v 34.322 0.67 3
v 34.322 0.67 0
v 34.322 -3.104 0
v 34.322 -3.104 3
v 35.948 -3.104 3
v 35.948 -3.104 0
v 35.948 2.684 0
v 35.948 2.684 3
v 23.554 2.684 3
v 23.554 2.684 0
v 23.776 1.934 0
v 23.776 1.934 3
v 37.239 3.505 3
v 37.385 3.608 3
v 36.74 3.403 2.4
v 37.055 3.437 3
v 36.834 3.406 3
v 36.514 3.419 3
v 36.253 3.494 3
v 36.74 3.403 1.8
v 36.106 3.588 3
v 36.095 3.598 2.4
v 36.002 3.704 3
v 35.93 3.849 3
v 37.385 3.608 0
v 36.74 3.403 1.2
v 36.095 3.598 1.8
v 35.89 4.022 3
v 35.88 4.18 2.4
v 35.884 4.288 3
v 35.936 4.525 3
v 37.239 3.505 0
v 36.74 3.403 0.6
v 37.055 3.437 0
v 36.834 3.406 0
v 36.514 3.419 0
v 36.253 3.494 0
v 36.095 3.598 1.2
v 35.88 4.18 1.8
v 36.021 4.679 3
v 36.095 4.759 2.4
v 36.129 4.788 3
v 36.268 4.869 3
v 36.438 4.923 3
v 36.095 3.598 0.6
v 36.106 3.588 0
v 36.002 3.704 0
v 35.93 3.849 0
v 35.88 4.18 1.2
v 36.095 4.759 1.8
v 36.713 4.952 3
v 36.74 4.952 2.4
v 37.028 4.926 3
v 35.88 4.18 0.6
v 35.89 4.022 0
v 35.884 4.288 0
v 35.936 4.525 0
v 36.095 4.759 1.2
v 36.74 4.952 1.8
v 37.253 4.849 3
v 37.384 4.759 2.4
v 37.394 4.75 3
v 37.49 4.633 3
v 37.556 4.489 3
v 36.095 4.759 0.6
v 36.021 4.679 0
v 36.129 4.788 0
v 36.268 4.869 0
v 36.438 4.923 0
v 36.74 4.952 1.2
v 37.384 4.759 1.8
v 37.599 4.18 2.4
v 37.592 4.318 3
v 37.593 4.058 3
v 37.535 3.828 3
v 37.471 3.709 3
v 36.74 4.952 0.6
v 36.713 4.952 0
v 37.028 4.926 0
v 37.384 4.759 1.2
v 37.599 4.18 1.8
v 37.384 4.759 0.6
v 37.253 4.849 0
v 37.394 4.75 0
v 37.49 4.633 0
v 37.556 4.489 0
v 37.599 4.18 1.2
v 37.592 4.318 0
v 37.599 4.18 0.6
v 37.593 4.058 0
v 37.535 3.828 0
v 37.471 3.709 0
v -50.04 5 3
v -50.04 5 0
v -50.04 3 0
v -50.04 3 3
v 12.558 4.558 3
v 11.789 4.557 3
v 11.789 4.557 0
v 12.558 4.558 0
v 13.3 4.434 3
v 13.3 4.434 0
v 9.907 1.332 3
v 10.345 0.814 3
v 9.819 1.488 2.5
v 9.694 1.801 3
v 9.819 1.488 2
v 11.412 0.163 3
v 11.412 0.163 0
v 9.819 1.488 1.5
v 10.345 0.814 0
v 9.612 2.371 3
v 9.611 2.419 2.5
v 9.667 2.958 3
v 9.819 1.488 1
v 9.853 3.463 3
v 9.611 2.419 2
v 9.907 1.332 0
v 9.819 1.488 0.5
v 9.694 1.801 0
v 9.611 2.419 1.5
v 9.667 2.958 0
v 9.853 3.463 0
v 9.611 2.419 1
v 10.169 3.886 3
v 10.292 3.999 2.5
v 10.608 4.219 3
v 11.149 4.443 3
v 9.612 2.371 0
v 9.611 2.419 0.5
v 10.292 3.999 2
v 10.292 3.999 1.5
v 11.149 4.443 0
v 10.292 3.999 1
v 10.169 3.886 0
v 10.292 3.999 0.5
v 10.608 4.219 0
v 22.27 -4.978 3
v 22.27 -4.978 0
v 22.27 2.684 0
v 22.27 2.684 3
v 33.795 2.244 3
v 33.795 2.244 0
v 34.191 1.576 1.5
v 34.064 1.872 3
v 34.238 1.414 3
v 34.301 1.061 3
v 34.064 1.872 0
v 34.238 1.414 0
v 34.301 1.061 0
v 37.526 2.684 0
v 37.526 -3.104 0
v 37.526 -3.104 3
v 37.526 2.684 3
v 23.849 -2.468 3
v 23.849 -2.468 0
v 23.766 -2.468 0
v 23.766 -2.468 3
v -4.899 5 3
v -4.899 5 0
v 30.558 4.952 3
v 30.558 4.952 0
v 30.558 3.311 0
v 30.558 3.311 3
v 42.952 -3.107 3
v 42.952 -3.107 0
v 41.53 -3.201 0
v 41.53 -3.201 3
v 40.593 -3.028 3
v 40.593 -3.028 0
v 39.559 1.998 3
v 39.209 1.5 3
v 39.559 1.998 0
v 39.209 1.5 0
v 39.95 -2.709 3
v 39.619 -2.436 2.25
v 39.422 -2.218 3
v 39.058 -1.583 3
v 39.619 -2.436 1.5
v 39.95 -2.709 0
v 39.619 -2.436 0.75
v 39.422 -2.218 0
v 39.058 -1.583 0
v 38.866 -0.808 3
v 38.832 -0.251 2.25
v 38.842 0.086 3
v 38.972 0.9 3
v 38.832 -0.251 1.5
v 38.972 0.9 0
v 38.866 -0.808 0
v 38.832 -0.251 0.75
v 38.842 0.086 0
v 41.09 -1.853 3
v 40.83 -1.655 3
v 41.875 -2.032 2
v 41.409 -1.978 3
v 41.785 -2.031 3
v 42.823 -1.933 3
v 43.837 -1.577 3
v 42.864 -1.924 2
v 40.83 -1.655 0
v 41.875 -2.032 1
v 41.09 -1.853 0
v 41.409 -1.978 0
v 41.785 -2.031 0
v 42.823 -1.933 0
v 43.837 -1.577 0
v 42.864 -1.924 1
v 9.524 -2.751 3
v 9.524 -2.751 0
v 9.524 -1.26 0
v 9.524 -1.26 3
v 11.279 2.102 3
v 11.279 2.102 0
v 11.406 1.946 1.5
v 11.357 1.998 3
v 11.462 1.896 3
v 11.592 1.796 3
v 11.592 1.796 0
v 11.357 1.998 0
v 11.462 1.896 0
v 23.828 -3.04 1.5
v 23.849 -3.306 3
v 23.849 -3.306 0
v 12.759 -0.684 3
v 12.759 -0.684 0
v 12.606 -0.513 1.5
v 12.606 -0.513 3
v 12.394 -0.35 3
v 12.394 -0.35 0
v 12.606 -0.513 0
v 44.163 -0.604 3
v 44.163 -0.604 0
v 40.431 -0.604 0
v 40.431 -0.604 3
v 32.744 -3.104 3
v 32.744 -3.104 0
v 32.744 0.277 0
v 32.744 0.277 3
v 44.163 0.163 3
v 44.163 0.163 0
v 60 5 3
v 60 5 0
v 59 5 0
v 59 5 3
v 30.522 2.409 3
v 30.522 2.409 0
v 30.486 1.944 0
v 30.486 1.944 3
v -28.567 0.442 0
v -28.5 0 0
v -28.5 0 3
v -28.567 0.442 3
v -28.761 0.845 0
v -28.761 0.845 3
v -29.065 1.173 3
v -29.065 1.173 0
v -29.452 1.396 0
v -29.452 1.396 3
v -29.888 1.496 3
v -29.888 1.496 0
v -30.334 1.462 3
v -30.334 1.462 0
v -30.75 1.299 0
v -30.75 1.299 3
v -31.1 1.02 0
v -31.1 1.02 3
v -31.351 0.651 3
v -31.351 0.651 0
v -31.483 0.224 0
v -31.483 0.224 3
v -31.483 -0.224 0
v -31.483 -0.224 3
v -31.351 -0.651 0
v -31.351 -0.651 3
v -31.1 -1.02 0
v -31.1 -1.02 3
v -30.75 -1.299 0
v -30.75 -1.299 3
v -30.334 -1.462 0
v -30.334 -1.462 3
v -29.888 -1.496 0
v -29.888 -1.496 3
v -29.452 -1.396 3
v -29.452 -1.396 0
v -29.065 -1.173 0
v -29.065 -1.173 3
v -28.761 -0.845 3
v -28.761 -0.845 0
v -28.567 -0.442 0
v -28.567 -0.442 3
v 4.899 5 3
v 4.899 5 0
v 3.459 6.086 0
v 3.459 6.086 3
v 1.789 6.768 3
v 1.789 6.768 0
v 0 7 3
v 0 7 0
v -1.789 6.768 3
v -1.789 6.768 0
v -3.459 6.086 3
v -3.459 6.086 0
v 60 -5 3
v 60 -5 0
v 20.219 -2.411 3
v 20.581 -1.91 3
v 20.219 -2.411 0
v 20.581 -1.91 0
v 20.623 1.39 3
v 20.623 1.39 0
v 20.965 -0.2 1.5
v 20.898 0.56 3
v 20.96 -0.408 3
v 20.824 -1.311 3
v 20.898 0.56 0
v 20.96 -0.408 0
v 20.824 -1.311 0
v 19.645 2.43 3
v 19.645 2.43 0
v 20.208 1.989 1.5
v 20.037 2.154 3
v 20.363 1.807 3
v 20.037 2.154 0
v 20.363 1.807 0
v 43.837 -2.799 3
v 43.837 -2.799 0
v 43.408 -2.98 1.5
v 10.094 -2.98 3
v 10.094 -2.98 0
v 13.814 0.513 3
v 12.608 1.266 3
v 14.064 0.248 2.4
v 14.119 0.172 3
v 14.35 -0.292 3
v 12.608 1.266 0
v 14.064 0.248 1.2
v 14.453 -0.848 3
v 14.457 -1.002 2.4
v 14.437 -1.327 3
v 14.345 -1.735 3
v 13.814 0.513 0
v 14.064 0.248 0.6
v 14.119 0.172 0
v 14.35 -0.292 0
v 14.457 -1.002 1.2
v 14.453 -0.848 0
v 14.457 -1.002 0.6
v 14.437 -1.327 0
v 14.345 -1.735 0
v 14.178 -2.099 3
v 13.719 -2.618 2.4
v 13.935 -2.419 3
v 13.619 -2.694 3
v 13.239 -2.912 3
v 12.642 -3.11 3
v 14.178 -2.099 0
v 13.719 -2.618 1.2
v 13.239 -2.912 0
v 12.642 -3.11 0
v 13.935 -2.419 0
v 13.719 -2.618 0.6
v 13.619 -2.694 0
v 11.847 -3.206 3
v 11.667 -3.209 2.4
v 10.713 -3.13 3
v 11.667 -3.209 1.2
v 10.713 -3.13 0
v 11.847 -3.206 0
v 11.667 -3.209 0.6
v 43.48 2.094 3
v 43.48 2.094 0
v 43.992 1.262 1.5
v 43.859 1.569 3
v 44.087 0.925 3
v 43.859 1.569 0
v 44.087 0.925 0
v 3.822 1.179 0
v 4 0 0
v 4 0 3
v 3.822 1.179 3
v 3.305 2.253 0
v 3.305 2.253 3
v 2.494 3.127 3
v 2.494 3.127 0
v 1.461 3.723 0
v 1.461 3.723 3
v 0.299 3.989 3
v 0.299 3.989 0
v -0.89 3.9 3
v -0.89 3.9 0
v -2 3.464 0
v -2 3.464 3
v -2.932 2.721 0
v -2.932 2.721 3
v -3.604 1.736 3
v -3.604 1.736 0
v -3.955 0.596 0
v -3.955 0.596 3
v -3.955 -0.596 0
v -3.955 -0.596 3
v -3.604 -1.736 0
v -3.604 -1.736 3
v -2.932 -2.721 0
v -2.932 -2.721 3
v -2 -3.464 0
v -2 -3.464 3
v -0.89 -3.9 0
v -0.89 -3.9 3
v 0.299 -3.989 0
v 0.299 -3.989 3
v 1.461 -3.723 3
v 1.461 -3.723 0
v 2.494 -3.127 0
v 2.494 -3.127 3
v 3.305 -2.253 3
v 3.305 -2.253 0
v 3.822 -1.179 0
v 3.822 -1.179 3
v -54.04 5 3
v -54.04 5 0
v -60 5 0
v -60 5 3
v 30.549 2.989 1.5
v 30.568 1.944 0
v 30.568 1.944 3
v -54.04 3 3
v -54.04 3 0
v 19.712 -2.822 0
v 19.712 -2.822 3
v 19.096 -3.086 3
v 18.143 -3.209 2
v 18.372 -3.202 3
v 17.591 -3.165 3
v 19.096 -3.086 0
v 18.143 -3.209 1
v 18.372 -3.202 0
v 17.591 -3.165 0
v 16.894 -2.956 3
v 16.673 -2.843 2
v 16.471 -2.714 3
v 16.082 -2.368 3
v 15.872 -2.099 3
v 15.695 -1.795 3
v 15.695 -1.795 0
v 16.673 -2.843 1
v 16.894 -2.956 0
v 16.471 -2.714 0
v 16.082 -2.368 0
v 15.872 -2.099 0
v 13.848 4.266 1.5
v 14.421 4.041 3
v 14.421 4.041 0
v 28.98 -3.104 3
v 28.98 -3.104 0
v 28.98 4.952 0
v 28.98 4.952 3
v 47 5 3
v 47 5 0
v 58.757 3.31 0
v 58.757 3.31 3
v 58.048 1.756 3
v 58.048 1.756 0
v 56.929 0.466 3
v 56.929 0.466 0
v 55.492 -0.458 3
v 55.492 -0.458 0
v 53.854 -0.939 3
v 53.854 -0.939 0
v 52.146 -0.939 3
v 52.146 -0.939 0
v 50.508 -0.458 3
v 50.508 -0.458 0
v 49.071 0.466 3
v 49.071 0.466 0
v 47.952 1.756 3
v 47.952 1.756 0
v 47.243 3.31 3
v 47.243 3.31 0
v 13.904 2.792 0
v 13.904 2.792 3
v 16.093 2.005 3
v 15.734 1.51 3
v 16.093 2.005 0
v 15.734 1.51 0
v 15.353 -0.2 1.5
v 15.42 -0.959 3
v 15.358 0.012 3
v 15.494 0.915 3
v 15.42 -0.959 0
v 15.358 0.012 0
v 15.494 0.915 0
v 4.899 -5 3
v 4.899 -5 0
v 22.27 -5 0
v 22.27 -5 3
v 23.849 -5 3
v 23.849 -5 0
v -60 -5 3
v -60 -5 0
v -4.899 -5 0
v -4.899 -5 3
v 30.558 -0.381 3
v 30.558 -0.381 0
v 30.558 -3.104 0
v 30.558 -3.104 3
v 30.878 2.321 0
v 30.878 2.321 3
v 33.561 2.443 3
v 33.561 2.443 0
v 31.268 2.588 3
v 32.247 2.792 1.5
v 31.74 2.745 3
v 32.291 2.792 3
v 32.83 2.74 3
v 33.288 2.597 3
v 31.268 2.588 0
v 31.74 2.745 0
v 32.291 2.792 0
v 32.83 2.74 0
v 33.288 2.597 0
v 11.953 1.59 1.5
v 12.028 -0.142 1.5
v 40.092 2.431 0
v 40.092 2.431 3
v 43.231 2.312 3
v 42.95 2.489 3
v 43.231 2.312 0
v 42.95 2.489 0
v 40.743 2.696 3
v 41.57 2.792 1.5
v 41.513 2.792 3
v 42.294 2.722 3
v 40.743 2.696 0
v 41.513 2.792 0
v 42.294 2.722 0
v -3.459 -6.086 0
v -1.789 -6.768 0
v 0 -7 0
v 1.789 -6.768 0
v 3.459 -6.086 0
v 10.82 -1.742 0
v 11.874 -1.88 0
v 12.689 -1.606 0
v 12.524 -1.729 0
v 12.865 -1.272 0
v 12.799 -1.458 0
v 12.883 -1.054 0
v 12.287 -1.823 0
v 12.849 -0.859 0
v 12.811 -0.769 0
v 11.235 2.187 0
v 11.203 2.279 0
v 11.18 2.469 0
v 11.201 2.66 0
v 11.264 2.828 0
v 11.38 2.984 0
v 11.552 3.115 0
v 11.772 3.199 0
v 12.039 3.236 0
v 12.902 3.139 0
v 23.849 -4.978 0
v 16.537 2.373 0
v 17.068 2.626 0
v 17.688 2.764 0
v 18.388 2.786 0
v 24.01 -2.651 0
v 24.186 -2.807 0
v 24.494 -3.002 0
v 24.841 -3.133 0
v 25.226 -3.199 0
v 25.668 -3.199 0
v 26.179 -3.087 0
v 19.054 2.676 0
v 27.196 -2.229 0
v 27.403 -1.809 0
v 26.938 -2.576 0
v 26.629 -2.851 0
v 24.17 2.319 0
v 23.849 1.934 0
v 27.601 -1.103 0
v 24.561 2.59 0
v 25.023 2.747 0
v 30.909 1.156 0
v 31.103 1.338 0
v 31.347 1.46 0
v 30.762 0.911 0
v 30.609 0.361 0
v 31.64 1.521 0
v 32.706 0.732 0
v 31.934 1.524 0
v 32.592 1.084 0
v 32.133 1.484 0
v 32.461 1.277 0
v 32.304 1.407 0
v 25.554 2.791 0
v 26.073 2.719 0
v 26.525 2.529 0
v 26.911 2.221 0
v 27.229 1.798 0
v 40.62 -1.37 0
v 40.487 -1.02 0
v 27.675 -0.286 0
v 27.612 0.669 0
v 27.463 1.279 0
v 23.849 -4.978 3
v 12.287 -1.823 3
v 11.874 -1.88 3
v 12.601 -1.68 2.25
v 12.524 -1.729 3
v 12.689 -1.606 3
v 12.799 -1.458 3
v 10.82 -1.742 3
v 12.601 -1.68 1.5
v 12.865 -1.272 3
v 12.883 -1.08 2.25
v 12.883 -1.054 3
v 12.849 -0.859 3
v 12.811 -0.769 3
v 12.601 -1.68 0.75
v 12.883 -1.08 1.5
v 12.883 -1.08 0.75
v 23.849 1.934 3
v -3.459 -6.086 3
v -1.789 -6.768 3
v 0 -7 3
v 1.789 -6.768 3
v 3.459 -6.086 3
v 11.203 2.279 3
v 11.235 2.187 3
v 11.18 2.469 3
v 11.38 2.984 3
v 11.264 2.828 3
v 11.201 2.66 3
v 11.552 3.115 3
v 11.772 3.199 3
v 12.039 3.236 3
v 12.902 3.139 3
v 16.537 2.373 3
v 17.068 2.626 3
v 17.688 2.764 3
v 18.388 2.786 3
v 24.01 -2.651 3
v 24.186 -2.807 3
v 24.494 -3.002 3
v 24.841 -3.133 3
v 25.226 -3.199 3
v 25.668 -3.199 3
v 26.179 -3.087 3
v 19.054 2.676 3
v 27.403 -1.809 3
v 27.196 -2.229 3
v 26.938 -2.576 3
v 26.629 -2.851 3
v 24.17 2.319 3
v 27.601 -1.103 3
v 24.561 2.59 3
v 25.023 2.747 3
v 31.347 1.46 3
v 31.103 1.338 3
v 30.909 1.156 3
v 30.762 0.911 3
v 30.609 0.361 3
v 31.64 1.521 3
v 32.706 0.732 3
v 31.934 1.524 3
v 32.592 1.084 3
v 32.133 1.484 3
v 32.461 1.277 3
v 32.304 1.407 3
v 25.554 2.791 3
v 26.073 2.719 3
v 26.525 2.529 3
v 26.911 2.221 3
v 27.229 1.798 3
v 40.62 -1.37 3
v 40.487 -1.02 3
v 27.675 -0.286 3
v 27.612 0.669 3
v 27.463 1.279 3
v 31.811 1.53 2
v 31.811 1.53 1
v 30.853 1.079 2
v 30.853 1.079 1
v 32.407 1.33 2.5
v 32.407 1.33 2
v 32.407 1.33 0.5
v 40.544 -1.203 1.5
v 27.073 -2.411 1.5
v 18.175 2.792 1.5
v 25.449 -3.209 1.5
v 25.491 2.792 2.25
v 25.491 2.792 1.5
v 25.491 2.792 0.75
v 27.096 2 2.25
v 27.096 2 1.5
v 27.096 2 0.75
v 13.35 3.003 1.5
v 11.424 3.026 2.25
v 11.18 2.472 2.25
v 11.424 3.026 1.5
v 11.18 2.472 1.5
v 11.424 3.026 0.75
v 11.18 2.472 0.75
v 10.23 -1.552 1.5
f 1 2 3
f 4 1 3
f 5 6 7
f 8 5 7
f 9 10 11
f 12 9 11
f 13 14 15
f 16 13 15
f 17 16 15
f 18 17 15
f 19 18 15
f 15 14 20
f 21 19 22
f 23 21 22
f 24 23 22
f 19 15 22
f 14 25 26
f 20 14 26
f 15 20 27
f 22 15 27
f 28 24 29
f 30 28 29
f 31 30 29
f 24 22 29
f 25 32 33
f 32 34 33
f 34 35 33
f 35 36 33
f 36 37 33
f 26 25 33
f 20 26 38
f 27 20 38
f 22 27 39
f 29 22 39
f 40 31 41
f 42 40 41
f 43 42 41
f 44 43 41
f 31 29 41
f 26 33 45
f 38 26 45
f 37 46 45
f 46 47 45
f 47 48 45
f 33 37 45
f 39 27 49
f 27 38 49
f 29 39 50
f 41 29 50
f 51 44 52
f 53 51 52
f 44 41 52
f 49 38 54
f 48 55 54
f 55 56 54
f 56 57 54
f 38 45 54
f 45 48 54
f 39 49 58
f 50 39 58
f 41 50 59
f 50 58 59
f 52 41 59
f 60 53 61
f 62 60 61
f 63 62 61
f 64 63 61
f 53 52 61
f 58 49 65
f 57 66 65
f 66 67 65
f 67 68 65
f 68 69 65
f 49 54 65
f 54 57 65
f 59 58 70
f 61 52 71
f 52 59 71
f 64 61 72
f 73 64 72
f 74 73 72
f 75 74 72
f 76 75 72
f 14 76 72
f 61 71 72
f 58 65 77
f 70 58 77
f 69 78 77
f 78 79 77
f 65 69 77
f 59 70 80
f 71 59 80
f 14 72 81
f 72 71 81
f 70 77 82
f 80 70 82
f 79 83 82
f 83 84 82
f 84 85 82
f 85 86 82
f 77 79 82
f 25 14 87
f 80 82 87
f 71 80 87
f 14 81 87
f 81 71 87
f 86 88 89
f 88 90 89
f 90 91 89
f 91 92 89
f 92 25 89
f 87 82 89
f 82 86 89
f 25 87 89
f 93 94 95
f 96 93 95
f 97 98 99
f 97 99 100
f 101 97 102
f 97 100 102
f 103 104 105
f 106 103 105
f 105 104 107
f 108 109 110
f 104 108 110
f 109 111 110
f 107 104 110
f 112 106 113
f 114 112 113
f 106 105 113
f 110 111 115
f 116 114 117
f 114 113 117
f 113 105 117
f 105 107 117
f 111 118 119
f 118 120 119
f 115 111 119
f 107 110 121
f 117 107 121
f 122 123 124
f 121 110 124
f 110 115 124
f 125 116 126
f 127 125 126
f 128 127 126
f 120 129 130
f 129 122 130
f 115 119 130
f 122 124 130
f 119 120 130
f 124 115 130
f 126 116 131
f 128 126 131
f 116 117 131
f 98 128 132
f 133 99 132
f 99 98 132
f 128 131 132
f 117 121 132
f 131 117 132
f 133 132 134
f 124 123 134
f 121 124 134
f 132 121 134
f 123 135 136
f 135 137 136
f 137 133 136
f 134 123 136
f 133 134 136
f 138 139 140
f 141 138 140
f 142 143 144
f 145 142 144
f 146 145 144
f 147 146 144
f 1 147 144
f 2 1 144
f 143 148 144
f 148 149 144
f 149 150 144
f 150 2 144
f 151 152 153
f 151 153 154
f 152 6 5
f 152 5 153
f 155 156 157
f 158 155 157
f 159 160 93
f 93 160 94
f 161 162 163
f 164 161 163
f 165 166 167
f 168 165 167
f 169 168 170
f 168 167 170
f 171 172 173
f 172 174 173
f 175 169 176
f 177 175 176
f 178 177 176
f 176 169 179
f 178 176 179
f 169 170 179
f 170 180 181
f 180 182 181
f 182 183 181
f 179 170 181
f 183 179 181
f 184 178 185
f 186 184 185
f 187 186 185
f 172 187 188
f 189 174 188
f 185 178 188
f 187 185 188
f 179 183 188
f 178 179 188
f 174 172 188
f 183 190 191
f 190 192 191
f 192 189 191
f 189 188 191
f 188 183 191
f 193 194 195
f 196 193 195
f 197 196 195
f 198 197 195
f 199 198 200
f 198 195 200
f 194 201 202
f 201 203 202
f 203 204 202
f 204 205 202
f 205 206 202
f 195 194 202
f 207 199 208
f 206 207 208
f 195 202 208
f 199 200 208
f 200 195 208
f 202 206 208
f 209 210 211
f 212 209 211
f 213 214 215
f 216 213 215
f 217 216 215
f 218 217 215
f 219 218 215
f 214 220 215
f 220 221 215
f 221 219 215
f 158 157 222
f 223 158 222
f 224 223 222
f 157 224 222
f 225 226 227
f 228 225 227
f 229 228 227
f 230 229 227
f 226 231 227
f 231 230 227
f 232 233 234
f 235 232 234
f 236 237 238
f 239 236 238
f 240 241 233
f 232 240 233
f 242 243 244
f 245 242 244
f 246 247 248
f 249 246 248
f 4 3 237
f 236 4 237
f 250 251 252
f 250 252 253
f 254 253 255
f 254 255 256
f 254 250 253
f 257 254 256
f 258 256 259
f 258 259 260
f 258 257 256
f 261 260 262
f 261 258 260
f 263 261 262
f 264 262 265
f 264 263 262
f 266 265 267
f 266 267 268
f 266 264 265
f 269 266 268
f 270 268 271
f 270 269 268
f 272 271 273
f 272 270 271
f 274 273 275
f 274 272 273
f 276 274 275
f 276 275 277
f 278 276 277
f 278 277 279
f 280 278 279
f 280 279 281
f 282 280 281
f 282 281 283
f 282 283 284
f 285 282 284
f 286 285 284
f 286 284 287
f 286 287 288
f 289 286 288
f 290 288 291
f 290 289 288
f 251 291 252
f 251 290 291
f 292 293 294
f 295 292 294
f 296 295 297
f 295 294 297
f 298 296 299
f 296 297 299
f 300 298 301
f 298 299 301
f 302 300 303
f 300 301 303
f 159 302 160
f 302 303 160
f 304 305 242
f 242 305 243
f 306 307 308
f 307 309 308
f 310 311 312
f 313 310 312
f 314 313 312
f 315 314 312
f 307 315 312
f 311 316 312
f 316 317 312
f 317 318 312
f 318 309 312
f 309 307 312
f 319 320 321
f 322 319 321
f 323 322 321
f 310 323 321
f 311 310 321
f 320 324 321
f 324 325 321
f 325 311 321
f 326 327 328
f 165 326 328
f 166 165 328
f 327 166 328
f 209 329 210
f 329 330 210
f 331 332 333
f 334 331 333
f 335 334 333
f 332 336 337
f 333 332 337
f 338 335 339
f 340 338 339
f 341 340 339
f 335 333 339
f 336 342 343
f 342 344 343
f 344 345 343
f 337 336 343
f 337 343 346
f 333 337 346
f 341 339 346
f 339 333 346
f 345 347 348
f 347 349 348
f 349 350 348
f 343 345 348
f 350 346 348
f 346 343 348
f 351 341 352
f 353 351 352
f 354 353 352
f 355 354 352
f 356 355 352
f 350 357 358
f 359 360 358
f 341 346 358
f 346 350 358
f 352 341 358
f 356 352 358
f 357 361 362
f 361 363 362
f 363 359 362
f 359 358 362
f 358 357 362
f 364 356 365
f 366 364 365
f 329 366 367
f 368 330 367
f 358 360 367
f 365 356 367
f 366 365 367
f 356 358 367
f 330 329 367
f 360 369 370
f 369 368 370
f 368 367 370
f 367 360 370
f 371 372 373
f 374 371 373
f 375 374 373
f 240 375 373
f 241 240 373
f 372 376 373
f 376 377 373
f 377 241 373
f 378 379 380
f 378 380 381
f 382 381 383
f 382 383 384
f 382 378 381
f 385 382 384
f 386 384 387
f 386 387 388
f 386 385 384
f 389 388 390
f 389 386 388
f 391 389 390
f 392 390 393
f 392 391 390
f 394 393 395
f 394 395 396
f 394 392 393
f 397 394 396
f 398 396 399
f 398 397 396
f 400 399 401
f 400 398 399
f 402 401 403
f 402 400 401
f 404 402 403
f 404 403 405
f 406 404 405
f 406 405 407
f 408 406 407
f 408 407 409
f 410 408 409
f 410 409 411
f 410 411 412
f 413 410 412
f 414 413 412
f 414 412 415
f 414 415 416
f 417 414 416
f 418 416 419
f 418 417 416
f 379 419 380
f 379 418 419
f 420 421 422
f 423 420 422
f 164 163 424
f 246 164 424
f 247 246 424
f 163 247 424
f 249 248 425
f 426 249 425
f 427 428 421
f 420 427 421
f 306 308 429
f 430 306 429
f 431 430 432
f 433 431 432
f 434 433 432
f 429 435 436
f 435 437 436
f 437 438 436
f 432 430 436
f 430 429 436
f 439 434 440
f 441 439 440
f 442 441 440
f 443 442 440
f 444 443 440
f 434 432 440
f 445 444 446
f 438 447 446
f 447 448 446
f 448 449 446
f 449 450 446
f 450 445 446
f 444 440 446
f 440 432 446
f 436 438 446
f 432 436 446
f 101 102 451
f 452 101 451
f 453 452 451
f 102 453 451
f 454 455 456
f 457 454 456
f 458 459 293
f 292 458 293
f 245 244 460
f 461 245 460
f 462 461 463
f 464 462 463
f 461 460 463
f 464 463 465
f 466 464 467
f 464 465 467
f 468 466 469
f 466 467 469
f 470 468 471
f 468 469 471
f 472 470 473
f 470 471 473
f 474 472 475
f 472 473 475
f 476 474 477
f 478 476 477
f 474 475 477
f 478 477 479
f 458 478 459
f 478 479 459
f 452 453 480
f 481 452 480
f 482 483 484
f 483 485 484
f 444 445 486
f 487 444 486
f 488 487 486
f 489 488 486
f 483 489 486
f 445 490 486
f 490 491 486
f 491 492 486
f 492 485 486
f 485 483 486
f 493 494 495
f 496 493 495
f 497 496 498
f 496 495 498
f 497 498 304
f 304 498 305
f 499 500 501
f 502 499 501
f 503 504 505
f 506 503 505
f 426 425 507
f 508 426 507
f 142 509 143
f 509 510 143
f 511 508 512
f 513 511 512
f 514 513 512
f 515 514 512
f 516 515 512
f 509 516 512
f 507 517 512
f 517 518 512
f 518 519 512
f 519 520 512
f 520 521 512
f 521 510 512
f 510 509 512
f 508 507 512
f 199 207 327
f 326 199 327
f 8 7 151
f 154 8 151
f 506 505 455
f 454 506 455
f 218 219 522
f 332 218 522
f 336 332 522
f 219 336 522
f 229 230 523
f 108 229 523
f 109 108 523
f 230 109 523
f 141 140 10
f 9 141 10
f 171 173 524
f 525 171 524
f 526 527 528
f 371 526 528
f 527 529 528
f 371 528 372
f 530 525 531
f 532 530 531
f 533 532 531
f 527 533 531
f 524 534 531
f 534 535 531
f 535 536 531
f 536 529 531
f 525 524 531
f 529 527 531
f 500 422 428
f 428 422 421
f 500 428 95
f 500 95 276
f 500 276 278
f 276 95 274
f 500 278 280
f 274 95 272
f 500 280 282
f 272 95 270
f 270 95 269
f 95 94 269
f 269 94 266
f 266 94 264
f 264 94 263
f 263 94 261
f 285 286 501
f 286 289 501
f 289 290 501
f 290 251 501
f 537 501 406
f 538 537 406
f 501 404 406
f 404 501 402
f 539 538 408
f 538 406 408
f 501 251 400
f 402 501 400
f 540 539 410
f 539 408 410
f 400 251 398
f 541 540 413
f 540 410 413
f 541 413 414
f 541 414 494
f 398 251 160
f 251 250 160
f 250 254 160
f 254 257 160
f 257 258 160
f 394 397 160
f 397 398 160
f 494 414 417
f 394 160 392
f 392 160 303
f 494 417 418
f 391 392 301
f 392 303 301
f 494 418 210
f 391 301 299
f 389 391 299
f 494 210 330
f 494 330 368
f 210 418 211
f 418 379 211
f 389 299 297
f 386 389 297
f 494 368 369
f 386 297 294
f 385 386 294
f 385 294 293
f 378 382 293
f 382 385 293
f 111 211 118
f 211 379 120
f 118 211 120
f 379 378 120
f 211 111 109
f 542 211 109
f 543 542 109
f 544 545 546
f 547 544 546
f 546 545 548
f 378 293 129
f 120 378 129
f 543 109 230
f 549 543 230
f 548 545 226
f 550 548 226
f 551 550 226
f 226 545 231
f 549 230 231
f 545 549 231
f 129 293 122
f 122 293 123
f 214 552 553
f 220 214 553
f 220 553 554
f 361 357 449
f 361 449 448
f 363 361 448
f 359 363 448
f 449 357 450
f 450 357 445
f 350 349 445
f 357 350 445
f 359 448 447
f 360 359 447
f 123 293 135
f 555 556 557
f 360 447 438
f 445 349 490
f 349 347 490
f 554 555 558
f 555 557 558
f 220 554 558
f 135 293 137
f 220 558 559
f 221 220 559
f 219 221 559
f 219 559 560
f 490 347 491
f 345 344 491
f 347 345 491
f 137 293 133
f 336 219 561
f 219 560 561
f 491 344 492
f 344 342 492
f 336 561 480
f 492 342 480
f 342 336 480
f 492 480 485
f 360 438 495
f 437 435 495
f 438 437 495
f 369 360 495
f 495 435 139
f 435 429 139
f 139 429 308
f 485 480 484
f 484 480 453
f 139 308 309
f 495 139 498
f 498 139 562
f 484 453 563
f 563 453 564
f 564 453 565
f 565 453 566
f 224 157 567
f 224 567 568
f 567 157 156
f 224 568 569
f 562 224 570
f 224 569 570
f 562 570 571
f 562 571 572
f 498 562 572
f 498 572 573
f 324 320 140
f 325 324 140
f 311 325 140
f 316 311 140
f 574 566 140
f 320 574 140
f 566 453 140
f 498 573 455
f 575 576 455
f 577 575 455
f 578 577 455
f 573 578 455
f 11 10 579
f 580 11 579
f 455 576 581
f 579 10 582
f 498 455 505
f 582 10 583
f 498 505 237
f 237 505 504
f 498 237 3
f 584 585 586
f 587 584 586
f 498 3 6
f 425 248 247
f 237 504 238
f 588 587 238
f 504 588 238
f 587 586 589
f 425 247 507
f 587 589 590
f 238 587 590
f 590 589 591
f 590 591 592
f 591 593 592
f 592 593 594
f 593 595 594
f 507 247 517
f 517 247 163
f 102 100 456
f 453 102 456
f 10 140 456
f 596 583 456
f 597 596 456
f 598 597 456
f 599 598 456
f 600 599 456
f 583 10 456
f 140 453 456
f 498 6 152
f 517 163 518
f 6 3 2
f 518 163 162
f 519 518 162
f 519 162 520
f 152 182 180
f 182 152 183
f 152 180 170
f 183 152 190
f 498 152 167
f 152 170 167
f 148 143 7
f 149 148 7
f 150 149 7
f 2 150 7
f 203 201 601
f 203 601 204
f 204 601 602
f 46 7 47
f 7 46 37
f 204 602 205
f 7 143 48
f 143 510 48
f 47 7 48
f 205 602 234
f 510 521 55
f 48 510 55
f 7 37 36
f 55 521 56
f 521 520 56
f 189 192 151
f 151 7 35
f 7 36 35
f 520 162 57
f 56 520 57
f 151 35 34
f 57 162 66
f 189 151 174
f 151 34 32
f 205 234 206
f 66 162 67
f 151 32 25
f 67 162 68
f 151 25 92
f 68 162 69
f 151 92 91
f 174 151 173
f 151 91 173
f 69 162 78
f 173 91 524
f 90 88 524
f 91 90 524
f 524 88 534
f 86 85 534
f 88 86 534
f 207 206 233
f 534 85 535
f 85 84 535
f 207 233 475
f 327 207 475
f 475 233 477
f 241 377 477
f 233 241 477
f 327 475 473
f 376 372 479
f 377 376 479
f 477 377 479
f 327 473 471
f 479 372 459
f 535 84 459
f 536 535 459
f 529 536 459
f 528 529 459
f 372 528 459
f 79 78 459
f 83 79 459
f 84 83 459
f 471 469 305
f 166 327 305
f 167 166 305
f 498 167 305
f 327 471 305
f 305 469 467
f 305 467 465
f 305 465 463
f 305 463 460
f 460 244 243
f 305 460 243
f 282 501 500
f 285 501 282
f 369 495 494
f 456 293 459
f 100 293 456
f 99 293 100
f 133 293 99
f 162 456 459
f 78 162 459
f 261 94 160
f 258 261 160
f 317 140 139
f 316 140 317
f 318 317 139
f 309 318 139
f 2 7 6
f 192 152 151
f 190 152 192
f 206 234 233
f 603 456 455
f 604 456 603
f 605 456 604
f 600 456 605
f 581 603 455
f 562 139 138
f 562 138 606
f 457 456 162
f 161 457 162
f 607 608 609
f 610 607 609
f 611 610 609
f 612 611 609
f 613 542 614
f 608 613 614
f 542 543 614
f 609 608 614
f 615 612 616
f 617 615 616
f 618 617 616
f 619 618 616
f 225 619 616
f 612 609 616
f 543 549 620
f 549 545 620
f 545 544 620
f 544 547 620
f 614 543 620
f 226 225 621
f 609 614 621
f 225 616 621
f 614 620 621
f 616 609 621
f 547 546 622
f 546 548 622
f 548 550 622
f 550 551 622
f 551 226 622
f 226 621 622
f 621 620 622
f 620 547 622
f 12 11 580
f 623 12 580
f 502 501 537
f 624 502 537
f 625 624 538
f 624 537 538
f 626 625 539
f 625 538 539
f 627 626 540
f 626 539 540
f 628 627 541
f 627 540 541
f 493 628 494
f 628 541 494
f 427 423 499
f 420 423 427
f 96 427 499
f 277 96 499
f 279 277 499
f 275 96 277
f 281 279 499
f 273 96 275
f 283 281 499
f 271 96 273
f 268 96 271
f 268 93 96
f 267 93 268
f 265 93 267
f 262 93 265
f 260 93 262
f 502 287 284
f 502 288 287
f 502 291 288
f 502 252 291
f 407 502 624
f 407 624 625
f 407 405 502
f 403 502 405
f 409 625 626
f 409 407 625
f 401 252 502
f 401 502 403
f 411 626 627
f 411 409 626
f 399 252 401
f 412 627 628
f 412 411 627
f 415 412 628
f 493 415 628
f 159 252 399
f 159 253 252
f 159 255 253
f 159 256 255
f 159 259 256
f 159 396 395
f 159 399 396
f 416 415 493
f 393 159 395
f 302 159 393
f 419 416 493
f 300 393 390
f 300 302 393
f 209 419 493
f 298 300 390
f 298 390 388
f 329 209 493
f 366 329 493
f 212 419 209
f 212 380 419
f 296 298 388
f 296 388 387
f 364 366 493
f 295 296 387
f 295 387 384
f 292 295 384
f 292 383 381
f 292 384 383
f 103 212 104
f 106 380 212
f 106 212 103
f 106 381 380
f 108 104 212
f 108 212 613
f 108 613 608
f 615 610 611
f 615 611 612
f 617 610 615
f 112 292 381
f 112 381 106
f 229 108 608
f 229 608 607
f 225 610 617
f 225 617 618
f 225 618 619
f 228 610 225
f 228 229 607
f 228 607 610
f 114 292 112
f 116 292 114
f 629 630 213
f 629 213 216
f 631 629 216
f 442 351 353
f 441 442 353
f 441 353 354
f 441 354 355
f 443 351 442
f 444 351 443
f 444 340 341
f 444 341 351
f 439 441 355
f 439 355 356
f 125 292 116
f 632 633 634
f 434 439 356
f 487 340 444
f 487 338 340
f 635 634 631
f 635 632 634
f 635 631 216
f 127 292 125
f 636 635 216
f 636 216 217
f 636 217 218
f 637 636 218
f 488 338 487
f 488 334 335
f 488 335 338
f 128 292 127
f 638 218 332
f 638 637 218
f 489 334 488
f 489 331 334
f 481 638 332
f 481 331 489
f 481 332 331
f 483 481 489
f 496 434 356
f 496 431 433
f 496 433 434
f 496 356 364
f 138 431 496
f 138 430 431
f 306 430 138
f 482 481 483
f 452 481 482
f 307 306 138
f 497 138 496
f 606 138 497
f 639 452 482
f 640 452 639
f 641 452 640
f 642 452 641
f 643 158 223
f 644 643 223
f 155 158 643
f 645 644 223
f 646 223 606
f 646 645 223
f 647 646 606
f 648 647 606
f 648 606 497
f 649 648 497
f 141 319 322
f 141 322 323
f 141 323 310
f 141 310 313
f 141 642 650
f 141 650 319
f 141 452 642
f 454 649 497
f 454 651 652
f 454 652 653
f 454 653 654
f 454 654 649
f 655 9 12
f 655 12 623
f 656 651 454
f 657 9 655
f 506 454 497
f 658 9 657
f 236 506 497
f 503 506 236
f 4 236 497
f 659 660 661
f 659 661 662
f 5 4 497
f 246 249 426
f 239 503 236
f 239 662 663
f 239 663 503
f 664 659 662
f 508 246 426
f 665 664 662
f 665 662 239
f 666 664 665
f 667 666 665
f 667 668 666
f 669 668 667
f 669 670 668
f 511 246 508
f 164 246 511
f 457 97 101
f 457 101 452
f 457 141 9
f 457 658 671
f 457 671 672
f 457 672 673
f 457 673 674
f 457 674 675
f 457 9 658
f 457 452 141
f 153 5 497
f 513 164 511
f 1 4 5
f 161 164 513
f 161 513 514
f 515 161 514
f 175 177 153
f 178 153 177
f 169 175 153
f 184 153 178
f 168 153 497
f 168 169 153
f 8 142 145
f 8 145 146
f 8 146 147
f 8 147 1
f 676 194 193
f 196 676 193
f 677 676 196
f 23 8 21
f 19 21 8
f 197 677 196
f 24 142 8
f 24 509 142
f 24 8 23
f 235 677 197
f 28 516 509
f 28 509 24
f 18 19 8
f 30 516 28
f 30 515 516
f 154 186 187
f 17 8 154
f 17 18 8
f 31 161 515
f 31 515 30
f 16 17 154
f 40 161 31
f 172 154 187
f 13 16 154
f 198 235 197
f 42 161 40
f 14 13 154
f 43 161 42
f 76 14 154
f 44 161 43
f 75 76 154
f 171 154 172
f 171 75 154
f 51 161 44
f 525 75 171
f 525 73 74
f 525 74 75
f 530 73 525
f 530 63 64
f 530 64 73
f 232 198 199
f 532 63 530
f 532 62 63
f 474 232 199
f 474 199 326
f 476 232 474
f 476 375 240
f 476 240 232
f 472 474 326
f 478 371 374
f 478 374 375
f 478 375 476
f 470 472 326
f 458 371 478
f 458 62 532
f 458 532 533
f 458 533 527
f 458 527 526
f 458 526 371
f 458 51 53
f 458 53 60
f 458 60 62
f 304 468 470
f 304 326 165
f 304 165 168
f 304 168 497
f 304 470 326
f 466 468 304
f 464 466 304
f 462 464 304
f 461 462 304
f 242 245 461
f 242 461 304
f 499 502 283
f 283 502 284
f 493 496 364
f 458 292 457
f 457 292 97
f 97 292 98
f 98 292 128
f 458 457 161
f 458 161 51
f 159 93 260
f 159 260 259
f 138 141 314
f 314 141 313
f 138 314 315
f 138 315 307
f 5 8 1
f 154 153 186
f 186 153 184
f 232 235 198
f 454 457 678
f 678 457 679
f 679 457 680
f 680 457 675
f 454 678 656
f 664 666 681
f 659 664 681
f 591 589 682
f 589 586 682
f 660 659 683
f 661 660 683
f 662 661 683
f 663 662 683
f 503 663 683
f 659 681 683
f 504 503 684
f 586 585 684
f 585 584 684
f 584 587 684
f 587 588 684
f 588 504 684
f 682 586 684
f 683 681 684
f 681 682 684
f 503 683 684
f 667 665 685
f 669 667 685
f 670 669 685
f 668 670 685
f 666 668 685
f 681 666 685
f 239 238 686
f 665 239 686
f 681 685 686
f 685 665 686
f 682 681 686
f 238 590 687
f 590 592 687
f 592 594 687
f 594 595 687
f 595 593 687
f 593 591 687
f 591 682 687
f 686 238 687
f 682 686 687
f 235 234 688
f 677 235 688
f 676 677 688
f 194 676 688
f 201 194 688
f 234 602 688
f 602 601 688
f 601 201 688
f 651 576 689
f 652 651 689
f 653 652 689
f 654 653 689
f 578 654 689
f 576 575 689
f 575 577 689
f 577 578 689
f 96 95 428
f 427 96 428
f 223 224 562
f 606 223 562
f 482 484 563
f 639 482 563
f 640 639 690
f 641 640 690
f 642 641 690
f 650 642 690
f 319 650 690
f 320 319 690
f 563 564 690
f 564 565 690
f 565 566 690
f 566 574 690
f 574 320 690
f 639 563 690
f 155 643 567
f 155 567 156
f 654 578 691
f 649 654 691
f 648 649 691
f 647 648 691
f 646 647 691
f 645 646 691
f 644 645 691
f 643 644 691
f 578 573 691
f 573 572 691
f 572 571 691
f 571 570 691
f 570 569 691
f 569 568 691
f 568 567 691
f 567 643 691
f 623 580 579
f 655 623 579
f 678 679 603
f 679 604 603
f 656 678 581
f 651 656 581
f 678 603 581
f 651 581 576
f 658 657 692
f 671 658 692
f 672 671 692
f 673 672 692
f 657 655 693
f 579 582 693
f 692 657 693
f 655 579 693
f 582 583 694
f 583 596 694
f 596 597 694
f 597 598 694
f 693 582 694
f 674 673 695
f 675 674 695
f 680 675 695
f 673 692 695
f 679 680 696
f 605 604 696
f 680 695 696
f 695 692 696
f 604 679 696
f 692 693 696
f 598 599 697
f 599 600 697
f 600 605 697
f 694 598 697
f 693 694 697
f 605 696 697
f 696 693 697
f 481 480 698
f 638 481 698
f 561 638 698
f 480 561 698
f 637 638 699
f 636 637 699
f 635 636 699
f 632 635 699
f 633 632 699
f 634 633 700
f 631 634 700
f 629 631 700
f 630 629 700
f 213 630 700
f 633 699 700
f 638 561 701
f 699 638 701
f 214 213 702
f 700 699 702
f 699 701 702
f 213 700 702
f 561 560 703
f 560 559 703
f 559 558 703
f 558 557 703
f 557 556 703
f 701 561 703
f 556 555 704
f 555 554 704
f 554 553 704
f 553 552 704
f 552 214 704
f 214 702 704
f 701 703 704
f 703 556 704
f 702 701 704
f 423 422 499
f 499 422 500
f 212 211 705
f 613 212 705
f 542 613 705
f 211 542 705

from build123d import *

# Parameters (mm, degrees)
F0_R     = 1.5
F0_R_2   = 4
F0_W     = 1.5788115779
F0_H     = 5.7884235604
F0_H_2   = 0.0224566273
F1_DEPTH = 3


with BuildPart() as f1:
    # F0 (on Top) → F1 (new body)
    with BuildSketch(Plane.XY):
        with BuildLine():
            Line((-54.0401674807, 5), (-60, 5))
            Line((-60, 5), (-60, -5))
            Line((-60, -5), (-4.8989794856, -5))
            ThreePointArc((-4.8989794856, -5), (-7, 0), (-4.8989794856, 5))
            Line((-4.8989794856, 5), (-50.0401674807, 5))
            Line((-50.0401674807, 5), (-50.0401674807, 3))
            Line((-50.0401674807, 3), (-54.0401674807, 3))
            Line((-54.0401674807, 3), (-54.0401674807, 5))
        make_face()
        with Locations((-30, 0)):
            Circle(F0_R, mode=Mode.SUBTRACT)
        with BuildLine():
            ThreePointArc((-4.8989794856, 5), (-7, 0), (-4.8989794856, -5))
            Line((-4.8989794856, -5), (4.8989794856, -5))
            ThreePointArc((4.8989794856, -5), (6.4534043883, -2.7117470016), (7, 0))
            ThreePointArc((7, 0), (6.4534043883, 2.7117470016), (4.8989794856, 5))
            Line((4.8989794856, 5), (-4.8989794856, 5))
        make_face()
        Circle(F0_R_2, mode=Mode.SUBTRACT)
        with BuildLine():
            Line((4.8989794856, -5), (-4.8989794856, -5))
            ThreePointArc((-4.8989794856, -5), (0, -7), (4.8989794856, -5))
        make_face()
        with BuildLine():
            ThreePointArc((4.8989794856, 5), (0, 7), (-4.8989794856, 5))
            Line((-4.8989794856, 5), (4.8989794856, 5))
        make_face()
        with BuildLine():
            ThreePointArc((7, 0), (6.4534043883, -2.7117470016), (4.8989794856, -5))
            Line((4.8989794856, -5), (22.270108379, -5))
            Line((22.270108379, -5), (22.270108379, -4.9775433727))
            Line((22.270108379, -4.9775433727), (22.270108379, 2.6842929448))
            Line((22.270108379, 2.6842929448), (23.5540317503, 2.6842929448))
            Line((23.5540317503, 2.6842929448), (23.7760262429, 1.9338190258))
            Line((23.7760262429, 1.9338190258), (23.8489199569, 1.9338190258))
            add(Edge.make_bspline(
                [(23.8489199569, 1.9338190258), (24.4039061884, 2.7919768404), (25.4906851969, 2.7919768404)],
                knots=[0, 0, 0, 1, 1, 1], degree=2))
            add(Edge.make_bspline(
                [(25.4906851969, 2.7919768404), (26.5161672186, 2.7919768404), (27.0960035798, 2.0000860385)],
                knots=[0, 0, 0, 1, 1, 1], degree=2))
            add(Edge.make_bspline(
                [(27.0960035798, 2.0000860385), (27.675839941, 1.2081952366), (27.675839941, -0.1999787835)],
                knots=[0, 0, 0, 1, 1, 1], degree=2))
            add(Edge.make_bspline(
                [(27.675839941, -0.1999787835), (27.675839941, -1.1260602862), (27.4033168513, -1.8094388548)],
                knots=[0, 0, 0, 1, 1, 1], degree=2))
            add(Edge.make_bspline(
                [(27.4033168513, -1.8094388548), (27.1307937615, -2.4928174234), (26.6288211402, -2.850659292)],
                knots=[0, 0, 0, 1, 1, 1], degree=2))
            add(Edge.make_bspline(
                [(26.6288211402, -2.850659292), (26.1268485189, -3.2085011607), (25.4492683139, -3.2085011607)],
                knots=[0, 0, 0, 1, 1, 1], degree=2))
            add(Edge.make_bspline(
                [(25.4492683139, -3.2085011607), (24.4287563181, -3.2085011607), (23.8489199569, -2.4679672936)],
                knots=[0, 0, 0, 1, 1, 1], degree=2))
            Line((23.8489199569, -2.4679672936), (23.766086191, -2.4679672936))
            add(Edge.make_bspline(
                [(23.766086191, -2.4679672936), (23.8489199569, -3.1919344075), (23.8489199569, -3.3062450044)],
                knots=[0, 0, 0, 1, 1, 1], degree=2))
            Line((23.8489199569, -3.3062450044), (23.8489199569, -4.9775433727))
            Line((23.8489199569, -4.9775433727), (23.8489199569, -5))
            Line((23.8489199569, -5), (60, -5))
            Line((60, -5), (60, 5))
            Line((60, 5), (59, 5))
            ThreePointArc((59, 5), (53, -1), (47, 5))
            Line((47, 5), (4.8989794856, 5))
            ThreePointArc((4.8989794856, 5), (6.4534043883, 2.7117470016), (7, 0))
        make_face()
        with BuildLine():
            add(Edge.make_bspline(
                [(14.0637671923, 0.2481518899), (14.4572275803, -0.2612757703), (14.4572275803, -1.0018096374)],
                knots=[0, 0, 0, 1, 1, 1], degree=2))
            add(Edge.make_bspline(
                [(14.4572275803, -1.0018096374), (14.4572275803, -2.0272916591), (13.7191787262, -2.6178964099)],
                knots=[0, 0, 0, 1, 1, 1], degree=2))
            add(Edge.make_bspline(
                [(13.7191787262, -2.6178964099), (12.9811298721, -3.2085011607), (11.6673863451, -3.2085011607)],
                knots=[0, 0, 0, 1, 1, 1], degree=2))
            add(Edge.make_bspline(
                [(11.6673863451, -3.2085011607), (10.4547000125, -3.2085011607), (9.5236484838, -2.751258773)],
                knots=[0, 0, 0, 1, 1, 1], degree=2))
            Line((9.5236484838, -2.751258773), (9.5236484838, -1.2602509869))
            add(Edge.make_bspline(
                [(9.5236484838, -1.2602509869), (10.2890324807, -1.6031827777), (10.81999692, -1.7423435044)],
                knots=[0, 0, 0, 1, 1, 1], degree=2))
            add(Edge.make_bspline(
                [(10.81999692, -1.7423435044), (11.3509613594, -1.8815042311), (11.7916369939, -1.8815042311)],
                knots=[0, 0, 0, 1, 1, 1], degree=2))
            add(Edge.make_bspline(
                [(11.7916369939, -1.8815042311), (12.318459745, -1.8815042311), (12.6009228867, -1.68021818)],
                knots=[0, 0, 0, 1, 1, 1], degree=2))
            add(Edge.make_bspline(
                [(12.6009228867, -1.68021818), (12.8833860284, -1.4789321289), (12.8833860284, -1.0796733773)],
                knots=[0, 0, 0, 1, 1, 1], degree=2))
            add(Edge.make_bspline(
                [(12.8833860284, -1.0796733773), (12.8833860284, -0.8576788847), (12.7591353795, -0.6837279763)],
                knots=[0, 0, 0, 1, 1, 1], degree=2))
            add(Edge.make_bspline(
                [(12.7591353795, -0.6837279763), (12.6348847307, -0.509777068), (12.3938384719, -0.3499078998)],
                knots=[0, 0, 0, 1, 1, 1], degree=2))
            add(Edge.make_bspline(
                [(12.3938384719, -0.3499078998), (12.1527922132, -0.1900387316), (11.4122583461, 0.162833111)],
                knots=[0, 0, 0, 1, 1, 1], degree=2))
            add(Edge.make_bspline(
                [(11.4122583461, 0.162833111), (10.7197680633, 0.4891981487), (10.3726945842, 0.7890563812)],
                knots=[0, 0, 0, 1, 1, 1], degree=2))
            add(Edge.make_bspline(
                [(10.3726945842, 0.7890563812), (10.0256211051, 1.0889146137), (9.8185366904, 1.4881733653)],
                knots=[0, 0, 0, 1, 1, 1], degree=2))
            add(Edge.make_bspline(
                [(9.8185366904, 1.4881733653), (9.6114522757, 1.8874321169), (9.6114522757, 2.4192248939)],
                knots=[0, 0, 0, 1, 1, 1], degree=2))
            add(Edge.make_bspline(
                [(9.6114522757, 2.4192248939), (9.6114522757, 3.4248268118), (10.2923458313, 3.9988648094)],
                knots=[0, 0, 0, 1, 1, 1], degree=2))
            add(Edge.make_bspline(
                [(10.2923458313, 3.9988648094), (10.9732393869, 4.572902807), (12.1743289923, 4.572902807)],
                knots=[0, 0, 0, 1, 1, 1], degree=2))
            add(Edge.make_bspline(
                [(12.1743289923, 4.572902807), (12.7641054055, 4.572902807), (13.3000398708, 4.4337420804)],
                knots=[0, 0, 0, 1, 1, 1], degree=2))
            add(Edge.make_bspline(
                [(13.3000398708, 4.4337420804), (13.8359743361, 4.2945813537), (14.4207807233, 4.04111003)],
                knots=[0, 0, 0, 1, 1, 1], degree=2))
            Line((14.4207807233, 4.04111003), (13.9038980241, 2.7919768404))
            add(Edge.make_bspline(
                [(13.9038980241, 2.7919768404), (13.2975548578, 3.0404781381), (12.9016094569, 3.1390503195)],
                knots=[0, 0, 0, 1, 1, 1], degree=2))
            add(Edge.make_bspline(
                [(12.9016094569, 3.1390503195), (12.5056640559, 3.2376225009), (12.1229720575, 3.2376225009)],
                knots=[0, 0, 0, 1, 1, 1], degree=2))
            add(Edge.make_bspline(
                [(12.1229720575, 3.2376225009), (11.6673863451, 3.2376225009), (11.4238550734, 3.0255680602)],
                knots=[0, 0, 0, 1, 1, 1], degree=2))
            add(Edge.make_bspline(
                [(11.4238550734, 3.0255680602), (11.1803238017, 2.8135136195), (11.1803238017, 2.4722385041)],
                knots=[0, 0, 0, 1, 1, 1], degree=2))
            add(Edge.make_bspline(
                [(11.1803238017, 2.4722385041), (11.1803238017, 2.2601840634), (11.2788959831, 2.1019715705)],
                knots=[0, 0, 0, 1, 1, 1], degree=2))
            add(Edge.make_bspline(
                [(11.2788959831, 2.1019715705), (11.3774681645, 1.9437590777), (11.5920076181, 1.7963149744)],
                knots=[0, 0, 0, 1, 1, 1], degree=2))
            add(Edge.make_bspline(
                [(11.5920076181, 1.7963149744), (11.8065470718, 1.6488708711), (12.6083779256, 1.2661788727)],
                knots=[0, 0, 0, 1, 1, 1], degree=2))
            add(Edge.make_bspline(
                [(12.6083779256, 1.2661788727), (13.6703068043, 0.7575795501), (14.0637671923, 0.2481518899)],
                knots=[0, 0, 0, 1, 1, 1], degree=2))
        make_face(mode=Mode.SUBTRACT)
        with BuildLine():
            add(Edge.make_bspline(
                [(20.6233731131, 1.3896011839), (20.9646482286, 0.7111926412), (20.9646482286, -0.1999787835)],
                knots=[0, 0, 0, 1, 1, 1], degree=2))
            add(Edge.make_bspline(
                [(20.9646482286, -0.1999787835), (20.9646482286, -1.6131228296), (20.2191443356, -2.4108119952)],
                knots=[0, 0, 0, 1, 1, 1], degree=2))
            add(Edge.make_bspline(
                [(20.2191443356, -2.4108119952), (19.4736404426, -3.2085011607), (18.1433301624, -3.2085011607)],
                knots=[0, 0, 0, 1, 1, 1], degree=2))
            add(Edge.make_bspline(
                [(18.1433301624, -3.2085011607), (17.3100224775, -3.2085011607), (16.6730308178, -2.8432042531)],
                knots=[0, 0, 0, 1, 1, 1], degree=2))
            add(Edge.make_bspline(
                [(16.6730308178, -2.8432042531), (16.0360391581, -2.4779073455), (15.6947640427, -1.7945287769)],
                knots=[0, 0, 0, 1, 1, 1], degree=2))
            add(Edge.make_bspline(
                [(15.6947640427, -1.7945287769), (15.3534889272, -1.1111502083), (15.3534889272, -0.1999787835)],
                knots=[0, 0, 0, 1, 1, 1], degree=2))
            add(Edge.make_bspline(
                [(15.3534889272, -0.1999787835), (15.3534889272, 1.2181352885), (16.0931944566, 2.0050560644)],
                knots=[0, 0, 0, 1, 1, 1], degree=2))
            add(Edge.make_bspline(
                [(16.0931944566, 2.0050560644), (16.832899986, 2.7919768404), (18.1748069934, 2.7919768404)],
                knots=[0, 0, 0, 1, 1, 1], degree=2))
            add(Edge.make_bspline(
                [(18.1748069934, 2.7919768404), (19.0081146783, 2.7919768404), (19.645106338, 2.4299932835)],
                knots=[0, 0, 0, 1, 1, 1], degree=2))
            add(Edge.make_bspline(
                [(19.645106338, 2.4299932835), (20.2820979977, 2.0680097265), (20.6233731131, 1.3896011839)],
                knots=[0, 0, 0, 1, 1, 1], degree=2))
        make_face(mode=Mode.SUBTRACT)
        with Locations((36.7370255918, -0.2099188355)):
            Rectangle(F0_W, F0_H, mode=Mode.SUBTRACT)
        with BuildLine():
            add(Edge.make_bspline(
                [(42.9520430465, -3.1074439663), (42.4815472563, -3.2085011607), (41.802310376, -3.2085011607)],
                knots=[0, 0, 0, 1, 1, 1], degree=2))
            add(Edge.make_bspline(
                [(41.802310376, -3.2085011607), (40.4057330831, -3.2085011607), (39.6188123071, -2.4364904626)],
                knots=[0, 0, 0, 1, 1, 1], degree=2))
            add(Edge.make_bspline(
                [(39.6188123071, -2.4364904626), (38.8318915311, -1.6644797645), (38.8318915311, -0.2513357184)],
                knots=[0, 0, 0, 1, 1, 1], degree=2))
            add(Edge.make_bspline(
                [(38.8318915311, -0.2513357184), (38.8318915311, 1.2032252106), (39.5591719957, 1.9976010255)],
                knots=[0, 0, 0, 1, 1, 1], degree=2))
            add(Edge.make_bspline(
                [(39.5591719957, 1.9976010255), (40.2864524602, 2.7919768404), (41.5703758315, 2.7919768404)],
                knots=[0, 0, 0, 1, 1, 1], degree=2))
            add(Edge.make_bspline(
                [(41.5703758315, 2.7919768404), (42.7963155667, 2.7919768404), (43.4796941353, 2.093688194)],
                knots=[0, 0, 0, 1, 1, 1], degree=2))
            add(Edge.make_bspline(
                [(43.4796941353, 2.093688194), (44.1630727038, 1.3953995475), (44.1630727038, 0.162833111)],
                knots=[0, 0, 0, 1, 1, 1], degree=2))
            Line((44.1630727038, 0.162833111), (44.1630727038, -0.6042075611))
            Line((44.1630727038, -0.6042075611), (40.4305832128, -0.6042075611))
            add(Edge.make_bspline(
                [(40.4305832128, -0.6042075611), (40.4570900179, -1.2768177401), (40.8298419644, -1.6545397126)],
                knots=[0, 0, 0, 1, 1, 1], degree=2))
            add(Edge.make_bspline(
                [(40.8298419644, -1.6545397126), (41.2025939109, -2.032261685), (41.87520409, -2.032261685)],
                knots=[0, 0, 0, 1, 1, 1], degree=2))
            add(Edge.make_bspline(
                [(41.87520409, -2.032261685), (42.3987134904, -2.032261685), (42.8642392547, -1.9237494517)],
                knots=[0, 0, 0, 1, 1, 1], degree=2))
            add(Edge.make_bspline(
                [(42.8642392547, -1.9237494517), (43.329765019, -1.8152372184), (43.8367076662, -1.5766759726)],
                knots=[0, 0, 0, 1, 1, 1], degree=2))
            Line((43.8367076662, -1.5766759726), (43.8367076662, -2.7993023572))
            add(Edge.make_bspline(
                [(43.8367076662, -2.7993023572), (43.4225388368, -3.0063867719), (42.9520430465, -3.1074439663)],
                knots=[0, 0, 0, 1, 1, 1], degree=2))
        make_face(mode=Mode.SUBTRACT)
        with BuildLine():
            Line((34.3224213161, 0.6697757583), (34.3224213161, -3.1041306157))
            Line((34.3224213161, -3.1041306157), (32.7436097382, -3.1041306157))
            Line((32.7436097382, -3.1041306157), (32.7436097382, 0.277143708))
            add(Edge.make_bspline(
                [(32.7436097382, 0.277143708), (32.7436097382, 1.5295902482), (31.8109015343, 1.5295902482)],
                knots=[0, 0, 0, 1, 1, 1], degree=2))
            add(Edge.make_bspline(
                [(31.8109015343, 1.5295902482), (31.1482314072, 1.5295902482), (30.8533432006, 1.0789745618)],
                knots=[0, 0, 0, 1, 1, 1], degree=2))
            add(Edge.make_bspline(
                [(30.8533432006, 1.0789745618), (30.558454994, 0.6283588754), (30.558454994, -0.3805563932)],
                knots=[0, 0, 0, 1, 1, 1], degree=2))
            Line((30.558454994, -0.3805563932), (30.558454994, -3.1041306157))
            Line((30.558454994, -3.1041306157), (28.9796434162, -3.1041306157))
            Line((28.9796434162, -3.1041306157), (28.9796434162, 4.9522814548))
            Line((28.9796434162, 4.9522814548), (30.558454994, 4.9522814548))
            Line((30.558454994, 4.9522814548), (30.558454994, 3.3105162149))
            add(Edge.make_bspline(
                [(30.558454994, 3.3105162149), (30.558454994, 3.118341878), (30.522008137, 2.409284842)],
                knots=[0, 0, 0, 1, 1, 1], degree=2))
            Line((30.522008137, 2.409284842), (30.48556128, 1.9437590777))
            Line((30.48556128, 1.9437590777), (30.5683950459, 1.9437590777))
            add(Edge.make_bspline(
                [(30.5683950459, 1.9437590777), (31.0968744723, 2.7919768404), (32.2466071429, 2.7919768404)],
                knots=[0, 0, 0, 1, 1, 1], degree=2))
            add(Edge.make_bspline(
                [(32.2466071429, 2.7919768404), (33.2671191386, 2.7919768404), (33.7947702274, 2.2436173102)],
                knots=[0, 0, 0, 1, 1, 1], degree=2))
            add(Edge.make_bspline(
                [(33.7947702274, 2.2436173102), (34.3224213161, 1.69525778), (34.3224213161, 0.6697757583)],
                knots=[0, 0, 0, 1, 1, 1], degree=2))
        make_face(mode=Mode.SUBTRACT)
        with BuildLine():
            add(Edge.make_bspline(
                [(36.7395106048, 3.4032900327), (35.8796961148, 3.4032900327), (35.8796961148, 4.1802707567)],
                knots=[0, 0, 0, 1, 1, 1], degree=2))
            add(Edge.make_bspline(
                [(35.8796961148, 4.1802707567), (35.8796961148, 4.9522814548), (36.7395106048, 4.9522814548)],
                knots=[0, 0, 0, 1, 1, 1], degree=2))
            add(Edge.make_bspline(
                [(36.7395106048, 4.9522814548), (37.5993250947, 4.9522814548), (37.5993250947, 4.1802707567)],
                knots=[0, 0, 0, 1, 1, 1], degree=2))
            add(Edge.make_bspline(
                [(37.5993250947, 4.1802707567), (37.5993250947, 3.8124888362), (37.384785641, 3.6078894344)],
                knots=[0, 0, 0, 1, 1, 1], degree=2))
            add(Edge.make_bspline(
                [(37.384785641, 3.6078894344), (37.1702461874, 3.4032900327), (36.7395106048, 3.4032900327)],
                knots=[0, 0, 0, 1, 1, 1], degree=2))
        make_face(mode=Mode.SUBTRACT)
        with Locations((23.059514168, -4.9887716863)):
            Rectangle(F0_W, F0_H_2)
    extrude(amount=F1_DEPTH)


solid = f1.part
